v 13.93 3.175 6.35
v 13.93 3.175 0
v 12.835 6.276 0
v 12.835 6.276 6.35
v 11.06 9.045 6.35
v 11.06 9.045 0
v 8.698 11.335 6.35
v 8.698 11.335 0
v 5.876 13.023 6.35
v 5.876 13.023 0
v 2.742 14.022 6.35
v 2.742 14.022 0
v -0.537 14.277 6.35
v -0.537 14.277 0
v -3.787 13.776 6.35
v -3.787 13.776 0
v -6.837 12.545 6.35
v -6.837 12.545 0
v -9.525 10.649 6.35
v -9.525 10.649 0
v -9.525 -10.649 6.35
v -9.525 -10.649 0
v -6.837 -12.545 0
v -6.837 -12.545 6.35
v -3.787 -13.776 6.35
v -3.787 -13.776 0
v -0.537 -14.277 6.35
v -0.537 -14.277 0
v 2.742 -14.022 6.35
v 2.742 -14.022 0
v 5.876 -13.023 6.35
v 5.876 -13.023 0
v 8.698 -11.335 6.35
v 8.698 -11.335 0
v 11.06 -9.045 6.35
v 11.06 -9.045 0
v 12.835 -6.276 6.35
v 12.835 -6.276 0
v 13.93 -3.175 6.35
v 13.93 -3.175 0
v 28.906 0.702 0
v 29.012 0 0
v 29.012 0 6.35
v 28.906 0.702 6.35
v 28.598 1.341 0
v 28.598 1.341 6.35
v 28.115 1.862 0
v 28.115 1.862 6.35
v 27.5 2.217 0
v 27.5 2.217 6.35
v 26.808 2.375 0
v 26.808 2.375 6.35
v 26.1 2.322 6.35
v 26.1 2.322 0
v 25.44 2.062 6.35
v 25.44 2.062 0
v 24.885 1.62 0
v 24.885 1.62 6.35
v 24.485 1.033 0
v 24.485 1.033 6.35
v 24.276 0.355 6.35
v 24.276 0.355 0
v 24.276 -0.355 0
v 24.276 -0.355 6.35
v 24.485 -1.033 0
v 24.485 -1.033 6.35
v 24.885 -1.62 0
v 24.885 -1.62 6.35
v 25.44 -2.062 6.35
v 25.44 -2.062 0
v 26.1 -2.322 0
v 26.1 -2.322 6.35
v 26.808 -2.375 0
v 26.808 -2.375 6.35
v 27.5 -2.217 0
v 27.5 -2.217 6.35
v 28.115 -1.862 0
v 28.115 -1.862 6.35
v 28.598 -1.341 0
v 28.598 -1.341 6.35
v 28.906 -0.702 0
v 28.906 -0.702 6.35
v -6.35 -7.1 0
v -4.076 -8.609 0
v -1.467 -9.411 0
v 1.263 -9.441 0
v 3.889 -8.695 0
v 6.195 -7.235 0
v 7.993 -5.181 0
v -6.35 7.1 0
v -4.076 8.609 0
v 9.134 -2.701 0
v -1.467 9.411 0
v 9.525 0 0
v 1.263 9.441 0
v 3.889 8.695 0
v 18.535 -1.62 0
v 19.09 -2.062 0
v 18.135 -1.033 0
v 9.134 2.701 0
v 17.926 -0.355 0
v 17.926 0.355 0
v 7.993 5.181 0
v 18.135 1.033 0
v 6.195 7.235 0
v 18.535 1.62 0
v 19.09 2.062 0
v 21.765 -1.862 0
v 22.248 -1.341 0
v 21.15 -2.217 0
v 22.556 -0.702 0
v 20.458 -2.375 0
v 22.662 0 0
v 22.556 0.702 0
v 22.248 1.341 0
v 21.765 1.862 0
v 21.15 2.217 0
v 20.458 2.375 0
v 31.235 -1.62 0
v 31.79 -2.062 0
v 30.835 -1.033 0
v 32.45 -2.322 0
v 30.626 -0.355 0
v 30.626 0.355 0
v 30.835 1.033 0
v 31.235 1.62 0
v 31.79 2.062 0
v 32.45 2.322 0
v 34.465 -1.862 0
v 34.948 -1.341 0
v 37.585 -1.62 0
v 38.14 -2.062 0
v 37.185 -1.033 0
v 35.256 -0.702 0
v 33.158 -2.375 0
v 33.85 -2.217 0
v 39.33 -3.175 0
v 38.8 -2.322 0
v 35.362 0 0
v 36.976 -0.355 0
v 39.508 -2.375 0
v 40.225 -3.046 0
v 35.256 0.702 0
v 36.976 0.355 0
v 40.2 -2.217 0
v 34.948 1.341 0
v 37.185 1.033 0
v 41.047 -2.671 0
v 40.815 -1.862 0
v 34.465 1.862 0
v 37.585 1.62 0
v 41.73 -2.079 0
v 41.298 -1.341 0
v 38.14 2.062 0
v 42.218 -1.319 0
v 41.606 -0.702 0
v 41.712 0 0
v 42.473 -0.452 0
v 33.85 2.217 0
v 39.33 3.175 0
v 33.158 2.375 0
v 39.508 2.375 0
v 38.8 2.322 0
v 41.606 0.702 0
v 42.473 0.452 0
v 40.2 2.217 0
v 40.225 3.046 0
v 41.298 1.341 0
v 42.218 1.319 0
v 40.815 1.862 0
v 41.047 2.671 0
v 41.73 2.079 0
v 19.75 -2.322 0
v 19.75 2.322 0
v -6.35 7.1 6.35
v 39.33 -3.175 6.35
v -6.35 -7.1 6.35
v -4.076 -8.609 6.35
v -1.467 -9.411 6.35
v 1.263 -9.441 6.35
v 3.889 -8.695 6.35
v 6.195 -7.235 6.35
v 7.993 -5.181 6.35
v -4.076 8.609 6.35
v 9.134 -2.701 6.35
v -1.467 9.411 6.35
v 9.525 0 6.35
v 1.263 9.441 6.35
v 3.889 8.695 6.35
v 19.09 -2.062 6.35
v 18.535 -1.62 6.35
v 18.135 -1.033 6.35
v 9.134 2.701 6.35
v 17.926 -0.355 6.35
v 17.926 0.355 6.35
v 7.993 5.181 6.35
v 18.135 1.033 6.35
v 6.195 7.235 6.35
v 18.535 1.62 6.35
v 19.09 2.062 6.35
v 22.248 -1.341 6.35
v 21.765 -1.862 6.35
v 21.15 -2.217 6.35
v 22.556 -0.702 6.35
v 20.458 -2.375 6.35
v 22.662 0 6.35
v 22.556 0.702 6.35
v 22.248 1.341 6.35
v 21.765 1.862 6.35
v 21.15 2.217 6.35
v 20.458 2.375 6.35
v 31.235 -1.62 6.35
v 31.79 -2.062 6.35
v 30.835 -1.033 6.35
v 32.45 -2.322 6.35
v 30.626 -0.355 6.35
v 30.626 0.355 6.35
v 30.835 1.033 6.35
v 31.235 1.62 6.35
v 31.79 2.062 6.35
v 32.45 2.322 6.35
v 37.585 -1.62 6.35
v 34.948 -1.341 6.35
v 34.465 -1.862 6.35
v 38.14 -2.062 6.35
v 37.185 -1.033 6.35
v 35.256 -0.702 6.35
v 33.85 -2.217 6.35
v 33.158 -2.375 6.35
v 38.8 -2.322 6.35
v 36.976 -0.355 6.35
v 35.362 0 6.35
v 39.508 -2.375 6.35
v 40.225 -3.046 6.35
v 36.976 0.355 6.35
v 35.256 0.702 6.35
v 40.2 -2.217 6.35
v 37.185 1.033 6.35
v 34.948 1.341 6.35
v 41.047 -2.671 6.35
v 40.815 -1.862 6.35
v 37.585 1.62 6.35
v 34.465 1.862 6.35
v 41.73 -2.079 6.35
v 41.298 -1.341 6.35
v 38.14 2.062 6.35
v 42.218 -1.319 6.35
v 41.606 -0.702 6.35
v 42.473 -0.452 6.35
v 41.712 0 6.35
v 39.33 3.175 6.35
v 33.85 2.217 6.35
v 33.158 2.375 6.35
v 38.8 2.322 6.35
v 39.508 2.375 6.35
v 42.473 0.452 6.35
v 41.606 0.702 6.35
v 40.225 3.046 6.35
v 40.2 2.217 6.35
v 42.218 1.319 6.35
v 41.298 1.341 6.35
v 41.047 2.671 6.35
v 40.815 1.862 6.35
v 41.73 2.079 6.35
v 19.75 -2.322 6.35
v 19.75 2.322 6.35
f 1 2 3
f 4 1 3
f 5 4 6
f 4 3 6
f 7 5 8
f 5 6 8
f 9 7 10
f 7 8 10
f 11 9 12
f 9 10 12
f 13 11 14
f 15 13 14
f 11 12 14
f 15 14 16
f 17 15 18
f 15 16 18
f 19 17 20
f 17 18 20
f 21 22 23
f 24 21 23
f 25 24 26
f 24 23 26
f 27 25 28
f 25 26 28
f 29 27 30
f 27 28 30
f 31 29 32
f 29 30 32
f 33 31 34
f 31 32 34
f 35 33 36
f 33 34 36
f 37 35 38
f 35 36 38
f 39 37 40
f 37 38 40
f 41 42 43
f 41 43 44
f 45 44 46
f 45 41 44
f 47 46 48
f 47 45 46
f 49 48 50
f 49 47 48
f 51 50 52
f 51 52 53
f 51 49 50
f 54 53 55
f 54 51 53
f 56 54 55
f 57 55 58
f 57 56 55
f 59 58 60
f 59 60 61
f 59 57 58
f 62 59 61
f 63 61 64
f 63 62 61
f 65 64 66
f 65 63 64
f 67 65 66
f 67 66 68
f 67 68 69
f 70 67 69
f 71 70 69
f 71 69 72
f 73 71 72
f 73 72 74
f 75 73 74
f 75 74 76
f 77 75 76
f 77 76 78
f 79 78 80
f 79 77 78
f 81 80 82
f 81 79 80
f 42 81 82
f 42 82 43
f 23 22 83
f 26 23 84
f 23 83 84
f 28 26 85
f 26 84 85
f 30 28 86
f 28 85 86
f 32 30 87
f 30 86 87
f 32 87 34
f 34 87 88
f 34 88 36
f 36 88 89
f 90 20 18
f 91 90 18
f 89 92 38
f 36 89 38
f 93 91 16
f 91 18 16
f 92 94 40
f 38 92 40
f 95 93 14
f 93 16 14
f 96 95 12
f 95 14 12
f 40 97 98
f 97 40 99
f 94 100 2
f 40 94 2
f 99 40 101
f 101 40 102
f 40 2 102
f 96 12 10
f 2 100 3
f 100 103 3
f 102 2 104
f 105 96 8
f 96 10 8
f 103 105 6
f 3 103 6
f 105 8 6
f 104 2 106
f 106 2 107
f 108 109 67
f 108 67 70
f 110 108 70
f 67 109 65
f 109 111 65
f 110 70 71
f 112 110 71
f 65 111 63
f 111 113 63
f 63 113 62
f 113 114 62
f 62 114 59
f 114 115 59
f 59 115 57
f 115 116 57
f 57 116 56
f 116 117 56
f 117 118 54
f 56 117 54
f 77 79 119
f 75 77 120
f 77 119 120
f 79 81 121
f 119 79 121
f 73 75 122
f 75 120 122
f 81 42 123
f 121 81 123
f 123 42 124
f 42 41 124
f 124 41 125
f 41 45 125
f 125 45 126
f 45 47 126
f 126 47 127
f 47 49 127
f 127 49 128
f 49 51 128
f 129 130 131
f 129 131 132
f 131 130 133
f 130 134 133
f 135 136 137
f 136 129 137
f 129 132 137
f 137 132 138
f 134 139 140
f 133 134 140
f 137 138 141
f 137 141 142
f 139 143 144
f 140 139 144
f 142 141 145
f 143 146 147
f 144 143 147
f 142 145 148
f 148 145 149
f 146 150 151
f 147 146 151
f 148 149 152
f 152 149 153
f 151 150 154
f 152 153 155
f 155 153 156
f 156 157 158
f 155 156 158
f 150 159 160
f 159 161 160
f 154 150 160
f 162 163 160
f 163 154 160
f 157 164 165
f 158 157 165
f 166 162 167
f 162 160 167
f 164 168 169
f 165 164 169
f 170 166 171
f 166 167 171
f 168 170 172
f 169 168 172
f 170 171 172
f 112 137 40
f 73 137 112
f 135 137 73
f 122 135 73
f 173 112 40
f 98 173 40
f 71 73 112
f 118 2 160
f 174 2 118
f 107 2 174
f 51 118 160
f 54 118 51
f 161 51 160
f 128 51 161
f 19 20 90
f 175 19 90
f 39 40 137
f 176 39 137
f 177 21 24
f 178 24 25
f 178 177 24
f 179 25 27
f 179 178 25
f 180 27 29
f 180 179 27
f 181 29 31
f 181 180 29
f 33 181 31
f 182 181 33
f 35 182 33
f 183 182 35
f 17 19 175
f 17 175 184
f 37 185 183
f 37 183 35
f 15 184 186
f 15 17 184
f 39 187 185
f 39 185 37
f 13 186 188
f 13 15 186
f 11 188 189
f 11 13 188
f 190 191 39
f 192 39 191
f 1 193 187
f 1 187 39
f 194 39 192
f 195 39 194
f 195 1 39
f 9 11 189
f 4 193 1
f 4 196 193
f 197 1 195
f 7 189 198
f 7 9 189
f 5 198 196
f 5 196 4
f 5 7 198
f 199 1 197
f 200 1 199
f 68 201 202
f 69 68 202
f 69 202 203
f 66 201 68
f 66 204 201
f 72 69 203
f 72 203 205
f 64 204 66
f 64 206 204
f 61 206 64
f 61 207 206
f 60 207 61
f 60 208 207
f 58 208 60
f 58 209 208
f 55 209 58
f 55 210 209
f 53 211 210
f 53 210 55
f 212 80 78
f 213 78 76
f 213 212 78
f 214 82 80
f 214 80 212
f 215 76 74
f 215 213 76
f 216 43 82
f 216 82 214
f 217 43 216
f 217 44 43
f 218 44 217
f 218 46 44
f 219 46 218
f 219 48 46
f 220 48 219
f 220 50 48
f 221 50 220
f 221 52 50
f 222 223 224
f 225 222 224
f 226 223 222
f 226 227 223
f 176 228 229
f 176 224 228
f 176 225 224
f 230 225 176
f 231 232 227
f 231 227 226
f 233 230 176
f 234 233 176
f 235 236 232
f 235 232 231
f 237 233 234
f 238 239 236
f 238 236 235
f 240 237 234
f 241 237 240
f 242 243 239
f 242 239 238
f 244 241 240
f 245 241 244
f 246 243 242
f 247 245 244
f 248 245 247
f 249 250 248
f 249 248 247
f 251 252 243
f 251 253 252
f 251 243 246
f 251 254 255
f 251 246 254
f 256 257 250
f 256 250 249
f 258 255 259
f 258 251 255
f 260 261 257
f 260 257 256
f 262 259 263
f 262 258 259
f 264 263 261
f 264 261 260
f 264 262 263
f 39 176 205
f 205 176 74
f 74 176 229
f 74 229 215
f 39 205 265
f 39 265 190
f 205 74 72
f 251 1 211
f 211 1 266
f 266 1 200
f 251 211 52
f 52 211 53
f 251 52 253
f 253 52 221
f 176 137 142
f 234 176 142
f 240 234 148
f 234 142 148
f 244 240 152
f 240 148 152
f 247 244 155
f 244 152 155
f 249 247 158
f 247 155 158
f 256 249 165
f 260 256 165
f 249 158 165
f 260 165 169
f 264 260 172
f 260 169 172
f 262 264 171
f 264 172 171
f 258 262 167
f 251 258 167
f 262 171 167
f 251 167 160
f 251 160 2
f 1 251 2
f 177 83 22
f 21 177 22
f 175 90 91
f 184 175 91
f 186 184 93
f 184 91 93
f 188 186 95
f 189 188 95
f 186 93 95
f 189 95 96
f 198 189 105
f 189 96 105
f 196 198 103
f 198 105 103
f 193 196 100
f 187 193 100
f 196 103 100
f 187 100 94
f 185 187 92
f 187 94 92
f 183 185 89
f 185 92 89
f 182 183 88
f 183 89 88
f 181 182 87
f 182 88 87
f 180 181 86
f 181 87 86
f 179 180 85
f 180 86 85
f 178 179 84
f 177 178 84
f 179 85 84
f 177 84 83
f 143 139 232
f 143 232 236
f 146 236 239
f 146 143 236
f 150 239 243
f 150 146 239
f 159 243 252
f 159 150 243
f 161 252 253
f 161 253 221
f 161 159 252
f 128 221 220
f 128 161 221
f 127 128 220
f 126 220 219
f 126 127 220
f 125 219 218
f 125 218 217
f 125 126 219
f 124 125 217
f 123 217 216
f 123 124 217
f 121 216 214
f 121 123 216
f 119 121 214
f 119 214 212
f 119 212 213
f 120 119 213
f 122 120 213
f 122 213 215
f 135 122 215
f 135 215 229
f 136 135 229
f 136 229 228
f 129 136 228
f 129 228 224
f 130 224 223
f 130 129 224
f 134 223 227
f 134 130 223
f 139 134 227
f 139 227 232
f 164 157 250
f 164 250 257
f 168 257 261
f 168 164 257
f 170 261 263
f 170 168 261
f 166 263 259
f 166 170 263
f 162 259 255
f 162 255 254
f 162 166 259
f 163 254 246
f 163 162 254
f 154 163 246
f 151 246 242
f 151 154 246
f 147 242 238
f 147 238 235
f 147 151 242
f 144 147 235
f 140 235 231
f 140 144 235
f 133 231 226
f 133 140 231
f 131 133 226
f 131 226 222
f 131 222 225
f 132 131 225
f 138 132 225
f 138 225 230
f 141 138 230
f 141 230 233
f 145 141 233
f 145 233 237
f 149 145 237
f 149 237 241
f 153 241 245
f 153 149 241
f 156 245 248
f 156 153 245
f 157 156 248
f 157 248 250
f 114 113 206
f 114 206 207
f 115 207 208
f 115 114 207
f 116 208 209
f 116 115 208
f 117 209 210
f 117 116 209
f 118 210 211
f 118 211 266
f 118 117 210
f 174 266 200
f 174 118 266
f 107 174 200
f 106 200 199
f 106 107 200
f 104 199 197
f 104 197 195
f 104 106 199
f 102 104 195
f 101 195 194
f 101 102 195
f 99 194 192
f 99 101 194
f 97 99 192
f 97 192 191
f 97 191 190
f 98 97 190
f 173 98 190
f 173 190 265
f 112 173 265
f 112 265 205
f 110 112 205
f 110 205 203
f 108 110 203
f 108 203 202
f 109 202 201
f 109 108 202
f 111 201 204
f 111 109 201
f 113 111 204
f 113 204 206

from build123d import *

# Parameters (mm, degrees)
F1_DEPTH = 6.35
F2_R     = 2.38125
F3_DEPTH = 6.35


with BuildPart() as f1:
    # F0 (on Top) → F1 (new body)
    with BuildSketch(Plane.XY):
        with BuildLine():
            Line((-9.525, 10.649274), (-6.35, 7.099516))
            ThreePointArc((-6.35, 7.099516), (9.525, 0), (-6.35, -7.099516))
            Line((-6.35, -7.099516), (-9.525, -10.649274))
            ThreePointArc((-9.525, -10.649274), (14.2875, 0), (-9.525, 10.649274))
        make_face()
    extrude(amount=F1_DEPTH)

    # F2 (on Top) → F3 (join, through all)
    with BuildSketch(Plane.XY):
        with BuildLine():
            Line((39.330256, 3.175), (13.930256, 3.175))
            ThreePointArc((13.930256, 3.175), (14.2875, 0), (13.930256, -3.175))
            Line((13.930256, -3.175), (39.330256, -3.175))
            ThreePointArc((39.330256, -3.175), (42.505256, 0), (39.330256, 3.175))
        make_face()
        with Locations((20.280256, 0)):
            Circle(F2_R, mode=Mode.SUBTRACT)
        with Locations((26.630256, 0)):
            Circle(F2_R, mode=Mode.SUBTRACT)
        with Locations((32.980256, 0)):
            Circle(F2_R, mode=Mode.SUBTRACT)
        with Locations((39.330256, 0)):
            Circle(F2_R, mode=Mode.SUBTRACT)
    extrude(amount=F3_DEPTH)


solid = f1.part
